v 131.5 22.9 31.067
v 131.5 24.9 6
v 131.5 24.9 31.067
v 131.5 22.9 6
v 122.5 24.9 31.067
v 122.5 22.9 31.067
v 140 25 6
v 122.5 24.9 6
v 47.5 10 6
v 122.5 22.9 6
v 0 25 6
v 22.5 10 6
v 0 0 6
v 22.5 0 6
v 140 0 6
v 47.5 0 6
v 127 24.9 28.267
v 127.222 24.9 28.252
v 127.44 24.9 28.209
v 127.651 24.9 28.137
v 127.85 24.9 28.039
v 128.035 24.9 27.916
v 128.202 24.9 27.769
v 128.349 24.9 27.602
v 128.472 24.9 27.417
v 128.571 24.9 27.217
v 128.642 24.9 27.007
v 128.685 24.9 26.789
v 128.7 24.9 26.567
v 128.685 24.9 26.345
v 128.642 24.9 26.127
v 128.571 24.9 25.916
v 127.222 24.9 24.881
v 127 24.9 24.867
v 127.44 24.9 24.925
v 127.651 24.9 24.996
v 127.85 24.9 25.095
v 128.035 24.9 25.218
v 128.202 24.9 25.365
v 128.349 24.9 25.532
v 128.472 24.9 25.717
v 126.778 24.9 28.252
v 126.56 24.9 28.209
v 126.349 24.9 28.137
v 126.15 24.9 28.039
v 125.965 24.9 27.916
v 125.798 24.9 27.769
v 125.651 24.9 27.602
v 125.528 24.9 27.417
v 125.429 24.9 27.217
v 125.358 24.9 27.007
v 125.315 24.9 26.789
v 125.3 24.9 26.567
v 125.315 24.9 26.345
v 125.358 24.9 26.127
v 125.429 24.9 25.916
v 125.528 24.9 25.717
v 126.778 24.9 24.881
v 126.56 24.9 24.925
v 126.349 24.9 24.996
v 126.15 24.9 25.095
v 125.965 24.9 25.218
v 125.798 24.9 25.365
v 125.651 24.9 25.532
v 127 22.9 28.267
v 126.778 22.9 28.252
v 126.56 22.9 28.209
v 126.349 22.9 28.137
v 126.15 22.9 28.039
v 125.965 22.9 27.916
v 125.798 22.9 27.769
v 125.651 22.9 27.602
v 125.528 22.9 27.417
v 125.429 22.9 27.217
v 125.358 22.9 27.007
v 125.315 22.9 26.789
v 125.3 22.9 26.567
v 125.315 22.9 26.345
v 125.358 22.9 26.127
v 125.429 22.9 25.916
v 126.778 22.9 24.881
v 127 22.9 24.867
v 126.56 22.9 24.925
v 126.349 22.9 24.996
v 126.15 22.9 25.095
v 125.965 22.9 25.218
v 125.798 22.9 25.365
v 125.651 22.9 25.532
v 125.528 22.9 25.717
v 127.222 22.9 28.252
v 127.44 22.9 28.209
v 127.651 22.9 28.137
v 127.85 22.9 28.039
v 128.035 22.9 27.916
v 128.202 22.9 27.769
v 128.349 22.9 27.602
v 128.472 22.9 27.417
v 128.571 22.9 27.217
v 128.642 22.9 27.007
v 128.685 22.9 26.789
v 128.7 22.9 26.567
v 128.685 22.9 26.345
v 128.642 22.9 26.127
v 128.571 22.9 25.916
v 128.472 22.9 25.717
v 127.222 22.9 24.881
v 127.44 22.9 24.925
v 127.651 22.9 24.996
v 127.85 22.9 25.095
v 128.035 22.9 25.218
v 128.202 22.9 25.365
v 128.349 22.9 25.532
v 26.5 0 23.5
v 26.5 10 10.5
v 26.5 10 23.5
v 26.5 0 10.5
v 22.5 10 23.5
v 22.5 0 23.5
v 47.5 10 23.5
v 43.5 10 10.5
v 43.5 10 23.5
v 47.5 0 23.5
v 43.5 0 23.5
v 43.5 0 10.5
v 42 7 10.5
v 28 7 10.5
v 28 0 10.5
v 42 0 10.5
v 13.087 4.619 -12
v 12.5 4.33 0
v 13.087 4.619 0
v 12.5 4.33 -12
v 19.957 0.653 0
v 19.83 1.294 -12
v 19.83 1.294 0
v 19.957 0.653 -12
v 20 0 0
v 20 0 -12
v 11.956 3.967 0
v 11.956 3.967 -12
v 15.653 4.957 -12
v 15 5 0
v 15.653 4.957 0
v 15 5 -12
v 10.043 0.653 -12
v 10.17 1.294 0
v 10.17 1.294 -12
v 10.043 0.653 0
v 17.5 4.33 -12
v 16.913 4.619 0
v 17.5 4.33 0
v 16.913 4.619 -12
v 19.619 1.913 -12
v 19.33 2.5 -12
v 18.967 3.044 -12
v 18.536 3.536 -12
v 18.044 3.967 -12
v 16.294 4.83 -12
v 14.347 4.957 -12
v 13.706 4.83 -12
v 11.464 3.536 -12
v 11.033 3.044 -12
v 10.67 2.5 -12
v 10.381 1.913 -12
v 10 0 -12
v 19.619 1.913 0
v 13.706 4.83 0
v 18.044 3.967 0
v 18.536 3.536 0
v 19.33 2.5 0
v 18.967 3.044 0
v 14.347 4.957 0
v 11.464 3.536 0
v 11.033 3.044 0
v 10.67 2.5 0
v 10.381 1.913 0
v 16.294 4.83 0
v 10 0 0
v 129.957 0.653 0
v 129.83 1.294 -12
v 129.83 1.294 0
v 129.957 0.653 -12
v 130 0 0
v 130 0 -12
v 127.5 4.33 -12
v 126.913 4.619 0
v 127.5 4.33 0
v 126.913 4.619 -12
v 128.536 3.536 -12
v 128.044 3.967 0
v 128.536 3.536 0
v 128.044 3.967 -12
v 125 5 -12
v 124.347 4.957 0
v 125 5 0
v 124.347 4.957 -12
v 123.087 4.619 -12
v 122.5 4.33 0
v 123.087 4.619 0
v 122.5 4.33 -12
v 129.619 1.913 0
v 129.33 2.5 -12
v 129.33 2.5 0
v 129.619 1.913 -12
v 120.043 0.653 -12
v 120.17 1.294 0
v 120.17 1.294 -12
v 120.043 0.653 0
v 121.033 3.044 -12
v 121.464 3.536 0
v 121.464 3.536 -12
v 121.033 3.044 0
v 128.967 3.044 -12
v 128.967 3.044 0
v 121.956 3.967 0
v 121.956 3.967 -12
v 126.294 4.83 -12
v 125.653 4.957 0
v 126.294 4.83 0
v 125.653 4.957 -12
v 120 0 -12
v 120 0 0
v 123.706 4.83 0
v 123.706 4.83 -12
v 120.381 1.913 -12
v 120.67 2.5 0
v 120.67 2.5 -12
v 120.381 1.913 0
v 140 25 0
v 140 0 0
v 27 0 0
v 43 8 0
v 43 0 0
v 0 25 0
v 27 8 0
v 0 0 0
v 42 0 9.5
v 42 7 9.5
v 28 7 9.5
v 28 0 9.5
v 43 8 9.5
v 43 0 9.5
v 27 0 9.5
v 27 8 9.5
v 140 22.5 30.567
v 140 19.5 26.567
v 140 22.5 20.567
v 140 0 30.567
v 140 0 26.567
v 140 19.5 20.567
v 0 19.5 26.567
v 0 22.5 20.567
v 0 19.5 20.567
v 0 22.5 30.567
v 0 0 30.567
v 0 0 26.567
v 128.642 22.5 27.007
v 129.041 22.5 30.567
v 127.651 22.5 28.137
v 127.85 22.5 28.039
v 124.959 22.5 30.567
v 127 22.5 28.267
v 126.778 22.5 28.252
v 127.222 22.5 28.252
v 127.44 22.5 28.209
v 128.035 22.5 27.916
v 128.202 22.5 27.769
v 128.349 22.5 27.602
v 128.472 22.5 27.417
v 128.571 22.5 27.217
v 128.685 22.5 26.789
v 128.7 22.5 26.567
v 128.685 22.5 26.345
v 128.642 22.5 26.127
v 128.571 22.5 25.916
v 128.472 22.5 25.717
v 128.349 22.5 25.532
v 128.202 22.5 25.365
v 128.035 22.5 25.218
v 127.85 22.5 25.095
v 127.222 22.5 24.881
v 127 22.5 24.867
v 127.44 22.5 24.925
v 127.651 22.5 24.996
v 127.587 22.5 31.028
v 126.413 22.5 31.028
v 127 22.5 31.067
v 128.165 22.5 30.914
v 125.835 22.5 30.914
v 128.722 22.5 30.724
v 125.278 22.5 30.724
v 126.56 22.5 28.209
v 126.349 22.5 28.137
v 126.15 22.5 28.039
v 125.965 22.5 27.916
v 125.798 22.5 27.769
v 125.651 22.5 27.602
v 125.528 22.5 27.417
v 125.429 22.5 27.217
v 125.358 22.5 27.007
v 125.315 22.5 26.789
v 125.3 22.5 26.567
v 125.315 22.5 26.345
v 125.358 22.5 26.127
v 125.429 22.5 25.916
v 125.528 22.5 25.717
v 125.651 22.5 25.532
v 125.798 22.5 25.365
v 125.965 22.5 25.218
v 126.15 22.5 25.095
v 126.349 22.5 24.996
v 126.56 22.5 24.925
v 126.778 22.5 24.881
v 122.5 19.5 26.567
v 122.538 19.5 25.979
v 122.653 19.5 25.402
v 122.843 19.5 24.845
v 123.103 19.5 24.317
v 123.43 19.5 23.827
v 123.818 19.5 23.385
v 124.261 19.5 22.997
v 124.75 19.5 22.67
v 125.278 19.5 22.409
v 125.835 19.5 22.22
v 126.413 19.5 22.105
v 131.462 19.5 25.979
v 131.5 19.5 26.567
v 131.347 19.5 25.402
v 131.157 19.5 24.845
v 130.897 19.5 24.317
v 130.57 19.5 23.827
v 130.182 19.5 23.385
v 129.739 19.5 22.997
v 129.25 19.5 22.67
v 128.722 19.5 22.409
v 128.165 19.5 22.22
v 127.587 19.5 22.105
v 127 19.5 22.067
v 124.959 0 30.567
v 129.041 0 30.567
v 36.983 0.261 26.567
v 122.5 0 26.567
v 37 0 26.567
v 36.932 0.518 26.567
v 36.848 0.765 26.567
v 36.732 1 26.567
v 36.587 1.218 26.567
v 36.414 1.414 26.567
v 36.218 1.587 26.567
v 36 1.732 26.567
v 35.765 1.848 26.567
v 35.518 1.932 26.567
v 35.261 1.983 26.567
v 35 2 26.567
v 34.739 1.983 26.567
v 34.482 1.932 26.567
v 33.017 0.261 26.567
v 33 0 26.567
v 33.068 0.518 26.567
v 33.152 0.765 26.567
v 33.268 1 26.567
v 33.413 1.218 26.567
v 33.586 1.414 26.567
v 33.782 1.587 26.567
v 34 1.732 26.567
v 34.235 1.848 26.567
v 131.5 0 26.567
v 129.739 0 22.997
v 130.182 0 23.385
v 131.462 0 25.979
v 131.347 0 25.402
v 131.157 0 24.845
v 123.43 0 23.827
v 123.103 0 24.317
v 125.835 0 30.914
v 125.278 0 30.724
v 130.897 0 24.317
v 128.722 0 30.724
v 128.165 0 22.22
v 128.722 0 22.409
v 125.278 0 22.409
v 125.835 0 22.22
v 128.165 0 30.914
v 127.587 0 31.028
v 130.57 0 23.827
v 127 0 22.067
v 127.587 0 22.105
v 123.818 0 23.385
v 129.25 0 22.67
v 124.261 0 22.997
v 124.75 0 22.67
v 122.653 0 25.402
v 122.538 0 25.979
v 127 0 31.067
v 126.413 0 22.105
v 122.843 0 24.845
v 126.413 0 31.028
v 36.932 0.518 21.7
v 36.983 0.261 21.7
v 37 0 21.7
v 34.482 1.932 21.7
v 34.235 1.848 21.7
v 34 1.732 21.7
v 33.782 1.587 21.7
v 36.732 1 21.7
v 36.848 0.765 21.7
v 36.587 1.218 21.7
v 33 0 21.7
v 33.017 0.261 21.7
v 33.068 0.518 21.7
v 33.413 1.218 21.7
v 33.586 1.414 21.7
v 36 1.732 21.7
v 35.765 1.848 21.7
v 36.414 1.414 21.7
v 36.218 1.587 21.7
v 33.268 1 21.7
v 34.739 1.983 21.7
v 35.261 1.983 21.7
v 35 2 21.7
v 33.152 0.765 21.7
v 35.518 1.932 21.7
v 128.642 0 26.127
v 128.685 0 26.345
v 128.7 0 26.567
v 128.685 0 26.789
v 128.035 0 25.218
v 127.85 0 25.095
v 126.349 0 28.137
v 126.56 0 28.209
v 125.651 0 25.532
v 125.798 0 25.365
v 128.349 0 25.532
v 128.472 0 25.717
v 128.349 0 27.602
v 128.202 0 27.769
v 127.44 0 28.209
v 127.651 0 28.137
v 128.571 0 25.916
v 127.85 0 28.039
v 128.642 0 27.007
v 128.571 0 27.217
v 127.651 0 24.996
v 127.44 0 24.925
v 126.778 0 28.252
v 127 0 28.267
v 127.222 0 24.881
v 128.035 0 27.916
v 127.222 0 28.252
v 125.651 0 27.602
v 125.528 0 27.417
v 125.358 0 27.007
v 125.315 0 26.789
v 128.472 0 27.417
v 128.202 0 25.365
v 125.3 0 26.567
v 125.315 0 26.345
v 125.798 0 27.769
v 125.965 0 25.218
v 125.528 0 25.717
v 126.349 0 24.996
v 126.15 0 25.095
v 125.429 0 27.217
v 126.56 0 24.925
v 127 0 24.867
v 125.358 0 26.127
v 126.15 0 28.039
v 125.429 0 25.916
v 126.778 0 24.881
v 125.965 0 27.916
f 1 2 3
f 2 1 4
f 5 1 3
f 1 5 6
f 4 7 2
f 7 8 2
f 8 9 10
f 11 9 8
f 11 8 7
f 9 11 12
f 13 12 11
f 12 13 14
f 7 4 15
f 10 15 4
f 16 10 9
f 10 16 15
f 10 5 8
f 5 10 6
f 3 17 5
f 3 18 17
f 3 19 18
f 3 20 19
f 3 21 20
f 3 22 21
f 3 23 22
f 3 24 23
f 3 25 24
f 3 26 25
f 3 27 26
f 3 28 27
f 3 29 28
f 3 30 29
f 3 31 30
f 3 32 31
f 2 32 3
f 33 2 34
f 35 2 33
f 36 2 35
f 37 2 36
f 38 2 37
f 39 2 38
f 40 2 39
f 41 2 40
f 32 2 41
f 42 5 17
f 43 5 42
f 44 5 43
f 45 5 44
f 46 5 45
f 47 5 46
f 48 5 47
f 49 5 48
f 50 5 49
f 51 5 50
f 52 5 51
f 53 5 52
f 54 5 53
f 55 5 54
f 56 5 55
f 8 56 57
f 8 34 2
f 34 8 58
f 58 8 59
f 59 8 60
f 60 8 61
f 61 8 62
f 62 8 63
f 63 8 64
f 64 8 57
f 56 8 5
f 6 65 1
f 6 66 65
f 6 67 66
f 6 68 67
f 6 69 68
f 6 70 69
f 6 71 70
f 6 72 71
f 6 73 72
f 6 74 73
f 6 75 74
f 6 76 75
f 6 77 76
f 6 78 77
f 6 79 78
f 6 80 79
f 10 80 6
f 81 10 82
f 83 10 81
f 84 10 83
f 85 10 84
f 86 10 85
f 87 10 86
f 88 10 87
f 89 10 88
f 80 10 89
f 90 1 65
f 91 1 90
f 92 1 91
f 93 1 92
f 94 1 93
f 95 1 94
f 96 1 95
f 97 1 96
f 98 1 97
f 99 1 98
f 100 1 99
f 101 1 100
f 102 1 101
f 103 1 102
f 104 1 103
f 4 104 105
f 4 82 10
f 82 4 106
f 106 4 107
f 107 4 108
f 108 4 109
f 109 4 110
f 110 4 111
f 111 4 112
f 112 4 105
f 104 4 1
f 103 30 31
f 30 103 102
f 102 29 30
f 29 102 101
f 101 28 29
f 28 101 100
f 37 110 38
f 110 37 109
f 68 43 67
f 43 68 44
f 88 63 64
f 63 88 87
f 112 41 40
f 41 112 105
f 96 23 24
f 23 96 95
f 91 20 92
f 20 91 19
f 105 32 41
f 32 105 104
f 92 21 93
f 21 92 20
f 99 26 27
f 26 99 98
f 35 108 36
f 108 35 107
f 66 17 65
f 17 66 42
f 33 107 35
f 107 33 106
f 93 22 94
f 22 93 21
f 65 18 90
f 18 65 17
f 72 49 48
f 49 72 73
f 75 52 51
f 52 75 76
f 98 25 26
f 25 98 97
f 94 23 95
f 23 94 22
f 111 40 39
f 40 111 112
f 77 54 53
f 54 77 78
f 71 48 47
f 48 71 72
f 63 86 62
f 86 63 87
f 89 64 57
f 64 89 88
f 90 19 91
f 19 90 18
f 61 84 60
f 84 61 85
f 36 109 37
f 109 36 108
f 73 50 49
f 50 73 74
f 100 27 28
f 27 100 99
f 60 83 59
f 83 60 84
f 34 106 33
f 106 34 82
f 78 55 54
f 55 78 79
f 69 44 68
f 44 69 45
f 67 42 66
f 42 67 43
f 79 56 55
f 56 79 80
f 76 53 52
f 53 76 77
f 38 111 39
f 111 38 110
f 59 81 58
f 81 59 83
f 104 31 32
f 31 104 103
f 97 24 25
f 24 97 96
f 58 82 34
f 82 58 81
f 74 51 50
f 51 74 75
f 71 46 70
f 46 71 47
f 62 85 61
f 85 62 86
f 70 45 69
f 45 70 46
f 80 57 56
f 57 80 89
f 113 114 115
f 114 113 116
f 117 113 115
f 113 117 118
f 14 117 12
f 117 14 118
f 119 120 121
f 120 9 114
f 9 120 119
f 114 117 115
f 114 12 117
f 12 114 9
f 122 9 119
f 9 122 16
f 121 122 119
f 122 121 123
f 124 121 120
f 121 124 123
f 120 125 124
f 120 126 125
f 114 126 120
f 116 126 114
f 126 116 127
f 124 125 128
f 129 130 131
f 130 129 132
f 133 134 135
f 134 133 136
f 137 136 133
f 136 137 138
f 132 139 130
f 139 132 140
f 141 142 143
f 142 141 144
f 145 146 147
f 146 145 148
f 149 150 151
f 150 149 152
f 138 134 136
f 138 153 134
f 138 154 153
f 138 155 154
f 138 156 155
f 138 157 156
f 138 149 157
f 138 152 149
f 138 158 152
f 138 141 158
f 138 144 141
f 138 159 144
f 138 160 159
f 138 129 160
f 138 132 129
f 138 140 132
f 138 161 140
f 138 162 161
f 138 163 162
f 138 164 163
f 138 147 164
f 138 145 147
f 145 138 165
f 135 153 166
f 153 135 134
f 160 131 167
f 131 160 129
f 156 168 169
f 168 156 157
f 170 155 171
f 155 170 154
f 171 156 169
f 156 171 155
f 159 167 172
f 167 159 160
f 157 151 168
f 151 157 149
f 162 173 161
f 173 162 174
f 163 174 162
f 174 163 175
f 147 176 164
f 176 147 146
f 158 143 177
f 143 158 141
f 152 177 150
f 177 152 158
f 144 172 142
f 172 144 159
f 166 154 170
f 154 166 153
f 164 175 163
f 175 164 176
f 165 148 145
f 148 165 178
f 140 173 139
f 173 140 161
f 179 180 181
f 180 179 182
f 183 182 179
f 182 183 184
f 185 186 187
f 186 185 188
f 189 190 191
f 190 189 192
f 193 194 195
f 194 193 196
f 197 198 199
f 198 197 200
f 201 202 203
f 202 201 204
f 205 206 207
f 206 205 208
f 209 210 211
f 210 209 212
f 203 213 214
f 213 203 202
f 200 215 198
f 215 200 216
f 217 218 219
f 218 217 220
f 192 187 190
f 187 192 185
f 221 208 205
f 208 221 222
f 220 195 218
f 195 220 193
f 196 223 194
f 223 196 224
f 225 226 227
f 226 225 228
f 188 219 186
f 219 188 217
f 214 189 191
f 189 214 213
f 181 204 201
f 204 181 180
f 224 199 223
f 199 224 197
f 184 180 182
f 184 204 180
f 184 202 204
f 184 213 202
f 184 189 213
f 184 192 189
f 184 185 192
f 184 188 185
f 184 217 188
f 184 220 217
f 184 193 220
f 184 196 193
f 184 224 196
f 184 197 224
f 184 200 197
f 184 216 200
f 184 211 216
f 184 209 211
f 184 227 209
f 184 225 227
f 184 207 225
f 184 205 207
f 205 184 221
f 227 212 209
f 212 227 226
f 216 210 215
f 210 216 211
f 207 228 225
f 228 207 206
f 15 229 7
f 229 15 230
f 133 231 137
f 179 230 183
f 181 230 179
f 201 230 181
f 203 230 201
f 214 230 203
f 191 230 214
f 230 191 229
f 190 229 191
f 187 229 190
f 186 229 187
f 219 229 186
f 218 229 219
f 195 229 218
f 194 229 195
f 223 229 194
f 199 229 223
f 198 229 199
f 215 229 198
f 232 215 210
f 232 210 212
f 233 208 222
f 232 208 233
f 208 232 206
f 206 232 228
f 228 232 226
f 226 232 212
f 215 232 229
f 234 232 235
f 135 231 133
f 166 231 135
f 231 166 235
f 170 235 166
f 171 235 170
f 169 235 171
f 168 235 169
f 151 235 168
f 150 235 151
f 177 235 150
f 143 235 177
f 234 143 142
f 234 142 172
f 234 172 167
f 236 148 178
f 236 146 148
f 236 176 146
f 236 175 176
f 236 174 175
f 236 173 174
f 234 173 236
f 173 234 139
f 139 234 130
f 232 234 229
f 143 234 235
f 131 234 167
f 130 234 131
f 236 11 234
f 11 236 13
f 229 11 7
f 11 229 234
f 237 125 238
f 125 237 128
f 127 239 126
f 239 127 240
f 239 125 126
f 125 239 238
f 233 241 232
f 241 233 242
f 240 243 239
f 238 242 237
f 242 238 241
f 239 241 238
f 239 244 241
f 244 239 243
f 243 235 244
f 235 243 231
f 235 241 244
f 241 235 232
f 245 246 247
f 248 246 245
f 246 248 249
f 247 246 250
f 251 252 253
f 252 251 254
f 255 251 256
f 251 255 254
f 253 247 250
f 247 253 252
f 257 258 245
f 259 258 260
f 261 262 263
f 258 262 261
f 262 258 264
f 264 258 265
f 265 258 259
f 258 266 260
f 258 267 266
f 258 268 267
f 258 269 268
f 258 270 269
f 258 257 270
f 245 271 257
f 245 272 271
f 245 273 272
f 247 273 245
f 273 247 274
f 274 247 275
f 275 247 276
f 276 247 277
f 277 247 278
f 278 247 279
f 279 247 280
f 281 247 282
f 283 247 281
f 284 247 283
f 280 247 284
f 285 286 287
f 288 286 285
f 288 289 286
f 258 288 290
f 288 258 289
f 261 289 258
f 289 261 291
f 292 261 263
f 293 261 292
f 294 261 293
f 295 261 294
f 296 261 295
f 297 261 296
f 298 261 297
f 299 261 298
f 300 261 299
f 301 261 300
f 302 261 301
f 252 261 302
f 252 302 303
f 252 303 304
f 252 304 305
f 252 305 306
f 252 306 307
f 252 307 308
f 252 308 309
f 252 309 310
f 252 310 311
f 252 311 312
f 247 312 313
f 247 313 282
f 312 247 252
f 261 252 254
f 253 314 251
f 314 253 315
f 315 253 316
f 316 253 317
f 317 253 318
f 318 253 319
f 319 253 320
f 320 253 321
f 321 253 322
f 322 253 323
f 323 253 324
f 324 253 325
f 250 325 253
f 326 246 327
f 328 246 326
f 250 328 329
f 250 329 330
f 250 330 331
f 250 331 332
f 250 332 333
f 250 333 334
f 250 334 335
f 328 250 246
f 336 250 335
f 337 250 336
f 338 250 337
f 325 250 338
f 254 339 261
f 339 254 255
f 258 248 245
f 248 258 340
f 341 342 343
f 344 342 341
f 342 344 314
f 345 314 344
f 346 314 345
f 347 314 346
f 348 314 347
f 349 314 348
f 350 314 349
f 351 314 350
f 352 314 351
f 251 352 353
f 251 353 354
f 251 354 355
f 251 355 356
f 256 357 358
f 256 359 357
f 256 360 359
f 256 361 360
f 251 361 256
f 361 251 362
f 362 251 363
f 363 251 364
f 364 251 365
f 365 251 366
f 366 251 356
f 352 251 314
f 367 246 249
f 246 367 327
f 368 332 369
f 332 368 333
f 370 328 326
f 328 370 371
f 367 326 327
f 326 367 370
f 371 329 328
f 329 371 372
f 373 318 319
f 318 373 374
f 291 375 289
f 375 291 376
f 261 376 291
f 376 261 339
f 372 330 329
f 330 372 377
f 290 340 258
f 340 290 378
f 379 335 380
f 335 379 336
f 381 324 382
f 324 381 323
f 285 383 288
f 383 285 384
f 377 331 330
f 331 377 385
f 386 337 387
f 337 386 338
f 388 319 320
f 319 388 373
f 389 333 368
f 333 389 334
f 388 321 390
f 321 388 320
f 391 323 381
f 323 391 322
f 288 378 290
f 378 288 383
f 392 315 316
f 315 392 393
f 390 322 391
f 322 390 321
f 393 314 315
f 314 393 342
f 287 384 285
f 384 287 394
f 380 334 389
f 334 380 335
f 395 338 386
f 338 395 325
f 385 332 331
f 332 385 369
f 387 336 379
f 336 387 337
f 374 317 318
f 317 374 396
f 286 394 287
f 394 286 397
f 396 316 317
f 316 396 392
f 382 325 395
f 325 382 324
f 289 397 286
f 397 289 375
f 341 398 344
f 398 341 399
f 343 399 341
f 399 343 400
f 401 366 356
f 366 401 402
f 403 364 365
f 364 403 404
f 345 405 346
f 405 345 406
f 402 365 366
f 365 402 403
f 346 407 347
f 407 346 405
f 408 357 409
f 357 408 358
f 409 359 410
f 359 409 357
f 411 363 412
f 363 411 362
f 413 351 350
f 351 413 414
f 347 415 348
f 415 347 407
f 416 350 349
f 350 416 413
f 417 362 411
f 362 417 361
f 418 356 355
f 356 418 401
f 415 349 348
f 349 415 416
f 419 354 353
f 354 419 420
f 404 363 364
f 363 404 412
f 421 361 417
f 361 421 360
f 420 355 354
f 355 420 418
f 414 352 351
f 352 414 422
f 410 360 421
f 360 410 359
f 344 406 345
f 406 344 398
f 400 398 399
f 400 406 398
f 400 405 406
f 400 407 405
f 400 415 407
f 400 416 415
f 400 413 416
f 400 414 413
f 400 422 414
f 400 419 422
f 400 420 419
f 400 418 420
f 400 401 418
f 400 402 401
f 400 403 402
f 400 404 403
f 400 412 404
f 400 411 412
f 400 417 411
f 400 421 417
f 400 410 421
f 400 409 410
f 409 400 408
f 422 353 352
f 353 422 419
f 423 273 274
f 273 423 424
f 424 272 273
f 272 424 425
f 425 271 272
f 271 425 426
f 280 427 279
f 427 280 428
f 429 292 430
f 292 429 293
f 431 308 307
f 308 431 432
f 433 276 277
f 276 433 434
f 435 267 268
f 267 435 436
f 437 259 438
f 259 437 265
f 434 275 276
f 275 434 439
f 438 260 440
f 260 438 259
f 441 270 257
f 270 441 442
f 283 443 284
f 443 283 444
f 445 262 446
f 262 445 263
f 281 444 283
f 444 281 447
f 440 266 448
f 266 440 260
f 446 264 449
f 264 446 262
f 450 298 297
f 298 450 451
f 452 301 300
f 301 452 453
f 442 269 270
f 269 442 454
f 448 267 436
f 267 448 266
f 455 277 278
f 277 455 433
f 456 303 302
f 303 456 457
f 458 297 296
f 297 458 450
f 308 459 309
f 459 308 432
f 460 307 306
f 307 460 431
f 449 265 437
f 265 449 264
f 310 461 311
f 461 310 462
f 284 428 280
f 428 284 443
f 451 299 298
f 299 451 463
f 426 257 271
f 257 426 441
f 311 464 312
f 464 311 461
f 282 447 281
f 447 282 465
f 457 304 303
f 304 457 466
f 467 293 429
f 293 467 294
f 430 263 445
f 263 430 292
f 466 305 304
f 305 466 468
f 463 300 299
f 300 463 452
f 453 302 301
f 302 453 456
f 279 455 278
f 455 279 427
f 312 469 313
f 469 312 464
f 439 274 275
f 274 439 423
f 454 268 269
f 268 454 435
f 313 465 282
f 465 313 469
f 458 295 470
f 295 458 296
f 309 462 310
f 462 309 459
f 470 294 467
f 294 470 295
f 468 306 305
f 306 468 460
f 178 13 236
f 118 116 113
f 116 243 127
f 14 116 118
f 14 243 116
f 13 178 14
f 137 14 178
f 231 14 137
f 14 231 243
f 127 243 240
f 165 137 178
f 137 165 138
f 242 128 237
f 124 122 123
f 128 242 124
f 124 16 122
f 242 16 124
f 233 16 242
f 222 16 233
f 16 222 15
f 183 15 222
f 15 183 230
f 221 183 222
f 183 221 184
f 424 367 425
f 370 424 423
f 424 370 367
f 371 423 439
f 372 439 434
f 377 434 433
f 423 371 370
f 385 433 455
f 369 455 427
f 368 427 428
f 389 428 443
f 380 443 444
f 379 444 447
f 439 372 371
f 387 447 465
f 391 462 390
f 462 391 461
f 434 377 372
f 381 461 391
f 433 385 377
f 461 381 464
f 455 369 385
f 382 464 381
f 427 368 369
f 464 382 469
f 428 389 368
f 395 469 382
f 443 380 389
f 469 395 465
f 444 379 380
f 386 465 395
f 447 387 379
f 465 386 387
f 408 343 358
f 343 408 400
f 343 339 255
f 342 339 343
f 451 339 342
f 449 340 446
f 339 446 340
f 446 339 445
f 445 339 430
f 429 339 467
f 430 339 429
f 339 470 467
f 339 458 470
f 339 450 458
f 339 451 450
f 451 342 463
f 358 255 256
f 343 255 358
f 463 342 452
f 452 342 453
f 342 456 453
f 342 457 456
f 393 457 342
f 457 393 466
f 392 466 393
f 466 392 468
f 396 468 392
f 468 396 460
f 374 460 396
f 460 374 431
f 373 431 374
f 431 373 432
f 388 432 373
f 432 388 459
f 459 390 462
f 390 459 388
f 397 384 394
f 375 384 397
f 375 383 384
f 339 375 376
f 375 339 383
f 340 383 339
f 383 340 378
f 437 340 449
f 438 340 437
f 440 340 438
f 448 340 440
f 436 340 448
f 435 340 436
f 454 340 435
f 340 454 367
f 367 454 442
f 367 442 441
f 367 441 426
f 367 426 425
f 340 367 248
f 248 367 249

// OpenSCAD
// =====================================================================
// mx_switch.scad — a to-scale MX switch, and the fit checks that use it
// =====================================================================
// NOTHING HERE IS FABRICATED. This file exists so the switch can be put in
// the board and looked at, instead of the fit being argued from numbers.
//
// It earns its place: the black keycap's cross socket was modelled 3.8 mm
// ABOVE the stem's cross for several revisions. Every dimension involved was
// individually correct and the sanity checks all passed, because nothing in
// the project drew the switch. Dropping this model in makes it obvious in one
// render.
//
//   mode "switch"      the switch on its own
//   mode "white"       section through a white key position   <- the stop fit
//   mode "black"       section through a black key position   <- the socket fit
//   mode "fit_slice"   plan cut at the housing, both rotations side by side
//
// For a section, set mode then look at it from the front (Ctrl+5 / View >
// Front). `press` drives the stem down so travel can be checked, not just
// the rest position.
//
// SOURCE: Kailh CPG1511F01S04-1 "Red Shaft", doc KH-PS1706-10 rev B, section 5
// "Profile Dimensions" -> ../docs/datasheets/kailh_CPG1511F01S04-1_red.pdf
// Every figure below is read off that drawing EXCEPT the two marked MEASURED
// OFF THE DRAWING, which the datasheet does not dimension.
// =====================================================================

include <piano_params.scad>
use     <piano_keys.scad>
use     <piano_base_printed.scad>

$fn = 32;

// ---------------------------------------------------------------------
// The switch
// ---------------------------------------------------------------------
// Origin at the CENTRE OF THE PLATE HOLE, z = 0 at the PLATE TOP — the same
// datum the datasheet dimensions from. So it is placed with
//   translate([x, y, mx_plate_z]) mx_switch();
//
// rot = 0 puts the wide (mx_housing_w) axis along x; rot = 90 puts the narrow
// (mx_housing_d) axis along x. With stop_clear at 17.0 both now fit — at the
// old 15.0 only rot = 90 did, which is what this model was written to catch.
module mx_switch(press = 0, rot = 0) {
    shaft_h = mx_stem_h - mx_cross_h - mx_housing_h;   // 1.70 of bare stem
    rotate([0, 0, rot]) {
        // ---- fixed: housing, clips, pins ----
        color("#3F4756") {
            translate([0, 0, mx_housing_h/2])
                cube([mx_housing_w, mx_housing_d, mx_housing_h], center = true);
            translate([0, 0, -mx_lower_h/2])
                cube([mx_cut - 0.05, mx_cut - 0.05, mx_lower_h], center = true);
            // clips, at their widest — this is what the relief below the plate
            // has to clear, not the 13.95 body
            translate([0, 0, -mx_lower_h + 0.6])
                cube([mx_clip_w, mx_cut - 0.05, 1.2], center = true);
        }
        color("#8A8F98") for (s = [-1, 1])
            translate([s*3, 2, -mx_lower_h - mx_pin_h/2])
                cube([1, 0.4, mx_pin_h], center = true);
        // ---- moving: stem shoulder + cross ----
        color("#B4553F") translate([0, 0, -press]) {
            translate([0, 0, mx_housing_h + shaft_h/2])
                cube([mx_shoulder_w, mx_shoulder_w, shaft_h], center = true);
            for (r = [0, 90]) rotate([0, 0, r])
                translate([0, 0, mx_stem_h - mx_cross_h/2])
                    cube([mx_mount_cross - 0.2, mx_mount_th - 0.15, mx_cross_h],
                         center = true);
        }
    }
}

// ---------------------------------------------------------------------
// Checks
// ---------------------------------------------------------------------
mode    = "black";
press   = 0;      // 0 = at rest. Try mx_press for a white key at its stop,
                  // or blk_travel for a black key bottomed out.
sw_rot  = 0;
section = true;   // Cut away the NEAR half (y < 0). Leave this ON for the front
                  // view: the key lever's side skirts hang 6 mm below the cap
                  // and sit between the camera and everything worth looking at.
                  // Uncut, a pressed key shows a skirt crossing the stop
                  // shoulder, which reads as contact when the two are 12 mm
                  // apart in y and never touch.

module cut() {
    if (section)
        difference() {
            children();
            translate([-60, -90, -40]) cube([320, 90, 140]);
        }
    else children();
}

// A white key position: switch between the stop shoulders, plunger on the
// stem. What to look for: the housing clear of both shoulders, and the cap
// underside reaching the shoulder tops exactly as the plunger reaches mx_press.
//
// The key ROTATES about the pin, it does not drop — which is the whole reason
// the stops ground it early. `press` is the travel at the PLUNGER, so the
// angle comes from plunger_arm and every other point on the cap moves by its
// own radius. Set press = mx_press to see it land.
module check_white() {
    ang = asin(press / plunger_arm);
    base_cell(-1);
    color("#E8E8E8")
        translate([pivot_x, 0, pivot_z])
            rotate([0, -ang, 0])
                translate([-pivot_x, 0, -pivot_z]) key_lever(-1);
    translate([contact_x, 0, mx_plate_z]) mx_switch(press, sw_rot);
}

// A black key position. This one DOES travel straight down — no lever — so the
// cap moves with the stem. What to look for: the keycap's socket SWALLOWING
// the cross rather than perching on top of it, and the slim boss — not the
// full-width post — being the only thing near the housing at full travel.
// Set press = blk_travel for the bottomed-out case.
module check_black() {
    base_cell(0);
    color("#E8E8E8") key_lever(0);
    color("#111111") translate([0, -pitch/2, -press]) black_key();
    translate([blk_switch_x, -pitch/2, mx_plate_z]) mx_switch(press, sw_rot);
}

// Plan cut level with the housing, showing both rotations. Separate islands
// mean the switch drops in; one merged blob means it fouls the shoulders.
module check_fit_slice() {
    z_cut = (mx_plate_z + housing_top_z) / 2;
    for (i = [0, 1])
        translate([0, i * 60, 0])
            projection(cut = true) translate([0, 0, -z_cut]) {
                base_cell(-1);
                translate([contact_x, 0, mx_plate_z]) mx_switch(0, i * 90);
            }
}

if      (mode == "switch")    mx_switch(press, sw_rot);
else if (mode == "white")     cut() check_white();
else if (mode == "black")     cut() check_black();
else if (mode == "fit_slice") check_fit_slice();
